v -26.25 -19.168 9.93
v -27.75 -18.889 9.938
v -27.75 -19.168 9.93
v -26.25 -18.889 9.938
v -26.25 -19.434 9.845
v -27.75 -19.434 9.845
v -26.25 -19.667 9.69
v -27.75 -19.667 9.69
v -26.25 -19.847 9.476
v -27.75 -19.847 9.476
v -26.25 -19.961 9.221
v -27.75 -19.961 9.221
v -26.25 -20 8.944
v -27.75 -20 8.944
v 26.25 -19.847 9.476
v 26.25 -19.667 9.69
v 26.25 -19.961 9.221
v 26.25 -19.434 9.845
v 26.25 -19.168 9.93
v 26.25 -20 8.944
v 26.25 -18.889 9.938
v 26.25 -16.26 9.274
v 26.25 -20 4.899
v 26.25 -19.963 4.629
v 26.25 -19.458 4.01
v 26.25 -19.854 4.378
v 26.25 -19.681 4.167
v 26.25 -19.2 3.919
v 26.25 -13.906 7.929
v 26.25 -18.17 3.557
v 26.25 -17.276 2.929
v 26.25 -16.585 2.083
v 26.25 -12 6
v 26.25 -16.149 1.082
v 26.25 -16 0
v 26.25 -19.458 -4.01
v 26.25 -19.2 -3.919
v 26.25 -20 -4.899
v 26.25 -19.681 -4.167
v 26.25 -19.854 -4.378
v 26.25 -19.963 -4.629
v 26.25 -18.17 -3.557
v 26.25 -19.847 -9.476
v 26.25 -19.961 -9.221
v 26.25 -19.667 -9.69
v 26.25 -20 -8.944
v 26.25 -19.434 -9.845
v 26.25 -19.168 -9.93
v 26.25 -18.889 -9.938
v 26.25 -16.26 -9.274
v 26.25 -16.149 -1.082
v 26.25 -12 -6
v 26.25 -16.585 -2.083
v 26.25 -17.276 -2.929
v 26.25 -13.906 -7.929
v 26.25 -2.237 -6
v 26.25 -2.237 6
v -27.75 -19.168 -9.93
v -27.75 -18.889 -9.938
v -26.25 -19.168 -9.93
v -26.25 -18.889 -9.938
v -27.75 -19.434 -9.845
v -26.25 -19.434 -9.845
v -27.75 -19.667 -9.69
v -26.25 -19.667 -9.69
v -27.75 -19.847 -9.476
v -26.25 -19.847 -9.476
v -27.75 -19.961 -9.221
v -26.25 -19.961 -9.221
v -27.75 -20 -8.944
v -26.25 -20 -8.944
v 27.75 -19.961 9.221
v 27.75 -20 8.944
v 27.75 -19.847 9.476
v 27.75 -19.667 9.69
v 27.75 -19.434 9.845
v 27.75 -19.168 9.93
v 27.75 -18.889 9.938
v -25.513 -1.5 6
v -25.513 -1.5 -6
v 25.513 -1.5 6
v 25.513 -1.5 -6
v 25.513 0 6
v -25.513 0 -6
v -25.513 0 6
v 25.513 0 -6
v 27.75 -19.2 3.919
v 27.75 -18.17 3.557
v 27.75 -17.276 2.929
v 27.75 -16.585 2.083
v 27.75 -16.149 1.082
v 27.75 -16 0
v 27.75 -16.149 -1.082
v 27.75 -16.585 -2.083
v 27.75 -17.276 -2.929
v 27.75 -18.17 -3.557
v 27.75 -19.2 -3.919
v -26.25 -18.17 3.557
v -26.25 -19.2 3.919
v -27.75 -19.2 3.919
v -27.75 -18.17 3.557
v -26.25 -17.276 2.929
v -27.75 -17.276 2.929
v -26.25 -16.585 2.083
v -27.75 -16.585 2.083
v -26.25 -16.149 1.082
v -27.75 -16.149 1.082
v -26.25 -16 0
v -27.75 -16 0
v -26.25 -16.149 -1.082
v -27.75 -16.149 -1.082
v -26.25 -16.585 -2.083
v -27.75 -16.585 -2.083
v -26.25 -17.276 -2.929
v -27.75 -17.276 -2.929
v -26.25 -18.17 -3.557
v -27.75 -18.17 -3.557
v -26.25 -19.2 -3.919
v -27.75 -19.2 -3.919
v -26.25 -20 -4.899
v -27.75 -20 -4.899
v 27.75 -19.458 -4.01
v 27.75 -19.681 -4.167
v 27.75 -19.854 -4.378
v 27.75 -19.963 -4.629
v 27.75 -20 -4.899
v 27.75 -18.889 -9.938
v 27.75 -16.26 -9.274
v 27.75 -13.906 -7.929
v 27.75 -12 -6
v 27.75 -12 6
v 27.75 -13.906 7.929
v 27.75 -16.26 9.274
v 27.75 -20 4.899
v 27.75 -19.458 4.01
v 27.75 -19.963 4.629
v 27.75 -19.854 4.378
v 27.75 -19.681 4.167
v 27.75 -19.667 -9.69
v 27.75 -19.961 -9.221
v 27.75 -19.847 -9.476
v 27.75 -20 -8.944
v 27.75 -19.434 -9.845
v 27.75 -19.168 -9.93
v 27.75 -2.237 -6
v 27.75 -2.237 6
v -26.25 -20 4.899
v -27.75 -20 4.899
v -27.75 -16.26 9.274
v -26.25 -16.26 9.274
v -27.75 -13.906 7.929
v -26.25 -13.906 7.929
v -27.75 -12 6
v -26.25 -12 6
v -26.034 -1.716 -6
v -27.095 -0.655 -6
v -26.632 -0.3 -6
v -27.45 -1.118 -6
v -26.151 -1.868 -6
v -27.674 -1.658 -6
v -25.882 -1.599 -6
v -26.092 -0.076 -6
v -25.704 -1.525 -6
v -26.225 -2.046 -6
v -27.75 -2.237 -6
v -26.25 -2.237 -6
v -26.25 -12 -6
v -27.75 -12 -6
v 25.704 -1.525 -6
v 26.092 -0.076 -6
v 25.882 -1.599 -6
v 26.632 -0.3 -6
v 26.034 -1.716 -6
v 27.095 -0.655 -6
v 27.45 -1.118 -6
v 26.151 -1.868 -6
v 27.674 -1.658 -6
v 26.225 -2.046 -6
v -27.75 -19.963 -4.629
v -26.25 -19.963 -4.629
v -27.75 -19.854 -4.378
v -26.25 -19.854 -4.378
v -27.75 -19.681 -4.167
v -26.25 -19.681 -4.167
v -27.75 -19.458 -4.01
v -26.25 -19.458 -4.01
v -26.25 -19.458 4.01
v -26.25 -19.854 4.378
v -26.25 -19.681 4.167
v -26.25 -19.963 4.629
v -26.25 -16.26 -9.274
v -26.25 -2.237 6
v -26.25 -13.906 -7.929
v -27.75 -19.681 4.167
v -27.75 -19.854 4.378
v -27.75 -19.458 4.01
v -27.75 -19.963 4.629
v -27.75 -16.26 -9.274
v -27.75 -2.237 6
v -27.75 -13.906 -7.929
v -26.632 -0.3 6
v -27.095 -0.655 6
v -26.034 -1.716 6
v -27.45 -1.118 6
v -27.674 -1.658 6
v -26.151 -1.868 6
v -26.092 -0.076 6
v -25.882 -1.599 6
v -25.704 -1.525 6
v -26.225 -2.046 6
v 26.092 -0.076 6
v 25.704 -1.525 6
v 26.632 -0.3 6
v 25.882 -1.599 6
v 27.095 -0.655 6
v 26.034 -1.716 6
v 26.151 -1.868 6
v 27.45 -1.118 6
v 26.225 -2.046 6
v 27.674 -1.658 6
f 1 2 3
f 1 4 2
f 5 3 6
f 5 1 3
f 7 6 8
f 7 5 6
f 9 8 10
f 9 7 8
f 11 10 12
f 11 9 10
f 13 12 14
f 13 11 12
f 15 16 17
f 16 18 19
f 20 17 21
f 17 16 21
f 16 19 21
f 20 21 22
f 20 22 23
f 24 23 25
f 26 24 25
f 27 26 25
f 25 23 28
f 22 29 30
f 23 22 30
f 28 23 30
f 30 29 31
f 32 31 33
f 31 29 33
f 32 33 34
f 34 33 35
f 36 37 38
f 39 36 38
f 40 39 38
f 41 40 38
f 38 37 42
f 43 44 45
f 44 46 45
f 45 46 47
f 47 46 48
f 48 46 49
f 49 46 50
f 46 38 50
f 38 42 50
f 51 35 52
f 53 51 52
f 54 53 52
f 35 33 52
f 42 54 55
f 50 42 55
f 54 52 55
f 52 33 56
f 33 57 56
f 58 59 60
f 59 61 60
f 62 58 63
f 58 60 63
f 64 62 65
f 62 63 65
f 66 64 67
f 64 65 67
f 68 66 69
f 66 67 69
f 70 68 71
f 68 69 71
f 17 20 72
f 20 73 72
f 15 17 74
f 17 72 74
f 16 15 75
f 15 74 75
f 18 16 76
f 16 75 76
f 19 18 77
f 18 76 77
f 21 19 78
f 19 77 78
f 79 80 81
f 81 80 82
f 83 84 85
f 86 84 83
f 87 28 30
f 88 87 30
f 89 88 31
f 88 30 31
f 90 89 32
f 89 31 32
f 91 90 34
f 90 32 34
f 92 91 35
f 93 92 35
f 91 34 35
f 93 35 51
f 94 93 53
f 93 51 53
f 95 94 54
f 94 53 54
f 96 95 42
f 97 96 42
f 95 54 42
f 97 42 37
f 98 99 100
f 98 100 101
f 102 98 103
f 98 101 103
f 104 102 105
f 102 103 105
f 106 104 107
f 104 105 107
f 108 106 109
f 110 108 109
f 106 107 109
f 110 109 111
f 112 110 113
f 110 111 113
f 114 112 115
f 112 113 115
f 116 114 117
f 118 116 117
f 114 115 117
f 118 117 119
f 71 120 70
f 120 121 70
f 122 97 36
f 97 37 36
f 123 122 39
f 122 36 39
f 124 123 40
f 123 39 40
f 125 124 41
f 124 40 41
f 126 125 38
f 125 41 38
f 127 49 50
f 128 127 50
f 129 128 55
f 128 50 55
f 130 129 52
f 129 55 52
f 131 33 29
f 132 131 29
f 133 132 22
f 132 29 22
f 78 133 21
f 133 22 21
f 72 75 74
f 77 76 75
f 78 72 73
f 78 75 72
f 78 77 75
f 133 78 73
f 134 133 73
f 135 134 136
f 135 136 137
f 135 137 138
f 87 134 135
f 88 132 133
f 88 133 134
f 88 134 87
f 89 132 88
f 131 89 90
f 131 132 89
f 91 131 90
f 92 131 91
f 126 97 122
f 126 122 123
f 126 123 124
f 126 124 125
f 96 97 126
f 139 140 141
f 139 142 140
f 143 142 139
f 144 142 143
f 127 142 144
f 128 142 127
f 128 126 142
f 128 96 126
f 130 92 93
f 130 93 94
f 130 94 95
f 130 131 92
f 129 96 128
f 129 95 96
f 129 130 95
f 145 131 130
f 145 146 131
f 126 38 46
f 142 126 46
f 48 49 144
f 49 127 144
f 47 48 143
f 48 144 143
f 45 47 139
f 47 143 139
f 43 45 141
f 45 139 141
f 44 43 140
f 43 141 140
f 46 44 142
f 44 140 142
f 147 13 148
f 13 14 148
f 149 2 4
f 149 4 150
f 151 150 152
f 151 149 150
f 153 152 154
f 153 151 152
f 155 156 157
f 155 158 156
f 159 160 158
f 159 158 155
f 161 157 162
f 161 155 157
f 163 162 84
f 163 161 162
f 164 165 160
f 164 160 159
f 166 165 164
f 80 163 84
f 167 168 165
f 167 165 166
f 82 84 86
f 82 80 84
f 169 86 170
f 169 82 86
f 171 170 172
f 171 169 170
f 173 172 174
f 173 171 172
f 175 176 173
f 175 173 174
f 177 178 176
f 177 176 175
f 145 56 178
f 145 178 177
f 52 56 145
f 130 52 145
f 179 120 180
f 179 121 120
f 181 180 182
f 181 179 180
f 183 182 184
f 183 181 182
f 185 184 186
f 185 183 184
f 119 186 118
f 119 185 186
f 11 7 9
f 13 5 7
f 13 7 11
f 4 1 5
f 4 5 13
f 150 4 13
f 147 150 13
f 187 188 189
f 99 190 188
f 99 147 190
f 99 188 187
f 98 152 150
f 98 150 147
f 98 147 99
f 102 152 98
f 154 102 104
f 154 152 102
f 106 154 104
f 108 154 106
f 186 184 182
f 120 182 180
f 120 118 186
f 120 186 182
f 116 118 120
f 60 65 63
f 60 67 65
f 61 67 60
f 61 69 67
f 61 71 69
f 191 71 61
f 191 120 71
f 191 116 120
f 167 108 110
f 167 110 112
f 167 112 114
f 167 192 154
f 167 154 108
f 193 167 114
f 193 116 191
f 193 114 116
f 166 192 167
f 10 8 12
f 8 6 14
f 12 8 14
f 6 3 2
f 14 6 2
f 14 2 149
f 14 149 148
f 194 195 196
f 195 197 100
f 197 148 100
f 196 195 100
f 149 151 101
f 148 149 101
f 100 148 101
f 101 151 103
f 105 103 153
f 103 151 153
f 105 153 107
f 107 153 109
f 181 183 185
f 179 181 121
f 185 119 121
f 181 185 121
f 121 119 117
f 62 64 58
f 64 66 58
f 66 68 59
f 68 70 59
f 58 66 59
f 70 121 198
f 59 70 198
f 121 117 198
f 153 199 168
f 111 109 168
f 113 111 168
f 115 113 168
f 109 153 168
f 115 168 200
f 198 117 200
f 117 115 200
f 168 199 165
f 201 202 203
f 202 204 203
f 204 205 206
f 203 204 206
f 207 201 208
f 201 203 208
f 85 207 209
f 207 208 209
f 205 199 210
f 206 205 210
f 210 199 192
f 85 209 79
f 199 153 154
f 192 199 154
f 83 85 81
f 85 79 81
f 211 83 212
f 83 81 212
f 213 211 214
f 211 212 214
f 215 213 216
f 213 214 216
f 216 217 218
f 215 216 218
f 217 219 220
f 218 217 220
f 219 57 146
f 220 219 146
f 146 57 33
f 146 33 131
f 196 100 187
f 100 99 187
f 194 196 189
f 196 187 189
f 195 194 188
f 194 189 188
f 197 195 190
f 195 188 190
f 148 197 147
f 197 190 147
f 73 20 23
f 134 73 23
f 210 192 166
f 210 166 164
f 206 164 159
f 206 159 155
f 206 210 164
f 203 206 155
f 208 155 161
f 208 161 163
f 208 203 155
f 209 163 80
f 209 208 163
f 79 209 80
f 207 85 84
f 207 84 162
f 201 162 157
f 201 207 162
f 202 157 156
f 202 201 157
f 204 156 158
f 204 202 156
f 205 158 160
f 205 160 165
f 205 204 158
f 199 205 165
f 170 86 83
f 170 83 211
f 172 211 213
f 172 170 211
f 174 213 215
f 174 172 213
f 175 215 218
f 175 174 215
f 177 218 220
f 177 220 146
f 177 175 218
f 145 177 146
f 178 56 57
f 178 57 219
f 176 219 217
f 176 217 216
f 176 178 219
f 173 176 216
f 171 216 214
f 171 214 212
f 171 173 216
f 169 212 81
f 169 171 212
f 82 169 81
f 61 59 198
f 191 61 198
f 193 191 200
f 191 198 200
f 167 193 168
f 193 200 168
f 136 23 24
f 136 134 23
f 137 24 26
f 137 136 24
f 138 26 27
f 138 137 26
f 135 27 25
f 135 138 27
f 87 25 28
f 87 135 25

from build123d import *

# Parameters (mm, degrees)
CROQUIS2_W                         = 55.5
CROQUIS2_H                         = 12
BRIDA_BASE1_DEPTH                  = 1.5
BRIDA_DE_ARISTA1_STRIP_W           = 7.4732
BRIDA_DE_ARISTA1_STRIP_H           = 1.5
BRIDA_DE_ARISTA1_STRIP_CUT_DEPTH   = 12
BRIDA_DE_ARISTA1_STRIP_2_W         = 7.4732
BRIDA_DE_ARISTA1_STRIP_2_H         = 1.5
BRIDA_DE_ARISTA1_STRIP_CUT_2_DEPTH = 12
BRIDA_DE_ARISTA1_DEPTH             = 12
BRIDA_DE_ARISTA1_BEND_DEPTH        = 12
SALIENTE_EXTRUIR1_DEPTH            = 1.5
SALIENTE_EXTRUIR2_START            = -1.5
SALIENTE_EXTRUIR2_DEPTH            = 1.5
CORTAR_EXTRUIR2_REACH              = 61.835
CROQUIS17_R                        = 4
REDONDEO1_R                        = 1
REDONDEO2_R                        = 1


# Sheet-metal steps are written as plain solids
with BuildPart() as part:
    # Croquis2 → Brida base1 (new body)
    with BuildSketch(Plane(origin=(0, 0, 0), x_dir=(1, 0, 0), z_dir=(0, 1, 0))):
        Rectangle(CROQUIS2_W, CROQUIS2_H)
    extrude(amount=-BRIDA_BASE1_DEPTH)

    # Brida de arista1 strip (across the edge) → Brida de arista1 strip cut (cut)
    with BuildSketch(Plane(origin=(-27.75, -1.5, 6), x_dir=(1, 0, 0), z_dir=(0, 0, -1))):
        with Locations((-1.5, -0.75)):
            Rectangle(BRIDA_DE_ARISTA1_STRIP_W, BRIDA_DE_ARISTA1_STRIP_H)
    extrude(amount=BRIDA_DE_ARISTA1_STRIP_CUT_DEPTH, mode=Mode.SUBTRACT)

    # Brida de arista1 strip 2 (across the edge) → Brida de arista1 strip cut 2 (cut)
    with BuildSketch(Plane(origin=(27.75, -1.5, -6), x_dir=(-1, 0, 0), z_dir=(0, 0, 1))):
        with Locations((-1.5, -0.75)):
            Rectangle(BRIDA_DE_ARISTA1_STRIP_2_W, BRIDA_DE_ARISTA1_STRIP_2_H)
    extrude(amount=BRIDA_DE_ARISTA1_STRIP_CUT_2_DEPTH, mode=Mode.SUBTRACT)

    # Brida de arista1 section (across the edge) → Brida de arista1 (add)
    with BuildSketch(Plane(origin=(-27.75, -1.5, 6), x_dir=(1, 0, 0), z_dir=(0, 0, -1))):
        with BuildLine():
            Line((0, 0.7366), (0, 18.5))
            Line((0, 18.5), (1.5, 18.5))
            Line((1.5, 18.5), (1.5, 0.7366))
            ThreePointArc((1.5, 0.7366), (1.715745145, 0.215745145), (2.2366, 0))
            Line((2.2366, 0), (2.2366, -1.5))
            ThreePointArc((2.2366, -1.5), (0.655084973, -0.844915027), (0, 0.7366))
        make_face()
    extrude(amount=BRIDA_DE_ARISTA1_DEPTH)

    # Brida de arista1 section 2 (across the edge) → Brida de arista1 bend (add)
    with BuildSketch(Plane(origin=(27.75, -1.5, -6), x_dir=(-1, 0, 0), z_dir=(0, 0, 1))):
        with BuildLine():
            Line((0, 0.7366), (0, 18.5))
            Line((0, 18.5), (1.5, 18.5))
            Line((1.5, 18.5), (1.5, 0.7366))
            ThreePointArc((1.5, 0.7366), (1.715745145, 0.215745145), (2.2366, 0))
            Line((2.2366, 0), (2.2366, -1.5))
            ThreePointArc((2.2366, -1.5), (0.655084973, -0.844915027), (0, 0.7366))
        make_face()
    extrude(amount=BRIDA_DE_ARISTA1_BEND_DEPTH)

    # Croquis13 → Saliente-Extruir1 (add)
    with BuildSketch(Plane.ZY.offset(27.75)):
        with BuildLine():
            Line((-6, -20), (-10, -20))
            ThreePointArc((-10, -20), (-8.94427191, -15.527864045), (-6, -12))
            Line((-6, -12), (-6, -20))
        make_face()
        with BuildLine():
            Line((6, -20), (10, -20))
            ThreePointArc((10, -20), (8.94427191, -15.527864045), (6, -12))
            Line((6, -12), (6, -20))
        make_face()
    extrude(amount=-SALIENTE_EXTRUIR1_DEPTH)

    # Croquis16 → Saliente-Extruir2 (add)
    with BuildSketch(Plane(origin=(27.75, 0, 0), x_dir=(0, 0, -1), z_dir=(1, 0, 0)).offset(SALIENTE_EXTRUIR2_START)):
        with BuildLine():
            Line((-10, -20), (-6, -20))
            Line((-6, -20), (-6, -12))
            ThreePointArc((-6, -12), (-8.94427191, -15.527864045), (-10, -20))
        make_face()
        with BuildLine():
            Line((6, -20), (10, -20))
            ThreePointArc((10, -20), (8.94427191, -15.527864045), (6, -12))
            Line((6, -12), (6, -20))
        make_face()
    extrude(amount=SALIENTE_EXTRUIR2_DEPTH)

    # Cortar-Extruir2: up to this face of the body (flat: up to its plane)
    cortar_extruir2_end = Plane(part.part.faces().sort_by_distance((27.75, -12.121081048, 0))[0])
    # Croquis17 → Cortar-Extruir2 (cut, up to the picked face)
    with BuildSketch(Plane.ZY.offset(27.75), mode=Mode.PRIVATE) as cortar_extruir2_sk1:
        with Locations((0, -20)):
            Circle(CROQUIS17_R)
    cortar_extruir2_tool1 = split(extrude(cortar_extruir2_sk1.sketch, amount=-CORTAR_EXTRUIR2_REACH, mode=Mode.PRIVATE), bisect_by=cortar_extruir2_end, keep=Keep.BOTH, mode=Mode.PRIVATE)
    add(cortar_extruir2_tool1.solids().sort_by(Axis((-27.75, -20, 0), (1, 0, 0)))[0], mode=Mode.SUBTRACT)

    # Redondeo1
    redondeo1_edges = [part.edges().sort_by_distance(p)[0] for p in [
        (27, -20, -10),
        (27, -20, 10),
        (27, -20, 4),
        (27, -20, -4),
    ]]
    fillet(redondeo1_edges, radius=REDONDEO1_R)

    # Redondeo2
    redondeo2_edges = [part.edges().sort_by_distance(p)[0] for p in [
        (-27, -20, -4),
        (-27, -20, 4),
        (-27, -20, -10),
        (-27, -20, 10),
    ]]
    fillet(redondeo2_edges, radius=REDONDEO2_R)


solid = part.part
